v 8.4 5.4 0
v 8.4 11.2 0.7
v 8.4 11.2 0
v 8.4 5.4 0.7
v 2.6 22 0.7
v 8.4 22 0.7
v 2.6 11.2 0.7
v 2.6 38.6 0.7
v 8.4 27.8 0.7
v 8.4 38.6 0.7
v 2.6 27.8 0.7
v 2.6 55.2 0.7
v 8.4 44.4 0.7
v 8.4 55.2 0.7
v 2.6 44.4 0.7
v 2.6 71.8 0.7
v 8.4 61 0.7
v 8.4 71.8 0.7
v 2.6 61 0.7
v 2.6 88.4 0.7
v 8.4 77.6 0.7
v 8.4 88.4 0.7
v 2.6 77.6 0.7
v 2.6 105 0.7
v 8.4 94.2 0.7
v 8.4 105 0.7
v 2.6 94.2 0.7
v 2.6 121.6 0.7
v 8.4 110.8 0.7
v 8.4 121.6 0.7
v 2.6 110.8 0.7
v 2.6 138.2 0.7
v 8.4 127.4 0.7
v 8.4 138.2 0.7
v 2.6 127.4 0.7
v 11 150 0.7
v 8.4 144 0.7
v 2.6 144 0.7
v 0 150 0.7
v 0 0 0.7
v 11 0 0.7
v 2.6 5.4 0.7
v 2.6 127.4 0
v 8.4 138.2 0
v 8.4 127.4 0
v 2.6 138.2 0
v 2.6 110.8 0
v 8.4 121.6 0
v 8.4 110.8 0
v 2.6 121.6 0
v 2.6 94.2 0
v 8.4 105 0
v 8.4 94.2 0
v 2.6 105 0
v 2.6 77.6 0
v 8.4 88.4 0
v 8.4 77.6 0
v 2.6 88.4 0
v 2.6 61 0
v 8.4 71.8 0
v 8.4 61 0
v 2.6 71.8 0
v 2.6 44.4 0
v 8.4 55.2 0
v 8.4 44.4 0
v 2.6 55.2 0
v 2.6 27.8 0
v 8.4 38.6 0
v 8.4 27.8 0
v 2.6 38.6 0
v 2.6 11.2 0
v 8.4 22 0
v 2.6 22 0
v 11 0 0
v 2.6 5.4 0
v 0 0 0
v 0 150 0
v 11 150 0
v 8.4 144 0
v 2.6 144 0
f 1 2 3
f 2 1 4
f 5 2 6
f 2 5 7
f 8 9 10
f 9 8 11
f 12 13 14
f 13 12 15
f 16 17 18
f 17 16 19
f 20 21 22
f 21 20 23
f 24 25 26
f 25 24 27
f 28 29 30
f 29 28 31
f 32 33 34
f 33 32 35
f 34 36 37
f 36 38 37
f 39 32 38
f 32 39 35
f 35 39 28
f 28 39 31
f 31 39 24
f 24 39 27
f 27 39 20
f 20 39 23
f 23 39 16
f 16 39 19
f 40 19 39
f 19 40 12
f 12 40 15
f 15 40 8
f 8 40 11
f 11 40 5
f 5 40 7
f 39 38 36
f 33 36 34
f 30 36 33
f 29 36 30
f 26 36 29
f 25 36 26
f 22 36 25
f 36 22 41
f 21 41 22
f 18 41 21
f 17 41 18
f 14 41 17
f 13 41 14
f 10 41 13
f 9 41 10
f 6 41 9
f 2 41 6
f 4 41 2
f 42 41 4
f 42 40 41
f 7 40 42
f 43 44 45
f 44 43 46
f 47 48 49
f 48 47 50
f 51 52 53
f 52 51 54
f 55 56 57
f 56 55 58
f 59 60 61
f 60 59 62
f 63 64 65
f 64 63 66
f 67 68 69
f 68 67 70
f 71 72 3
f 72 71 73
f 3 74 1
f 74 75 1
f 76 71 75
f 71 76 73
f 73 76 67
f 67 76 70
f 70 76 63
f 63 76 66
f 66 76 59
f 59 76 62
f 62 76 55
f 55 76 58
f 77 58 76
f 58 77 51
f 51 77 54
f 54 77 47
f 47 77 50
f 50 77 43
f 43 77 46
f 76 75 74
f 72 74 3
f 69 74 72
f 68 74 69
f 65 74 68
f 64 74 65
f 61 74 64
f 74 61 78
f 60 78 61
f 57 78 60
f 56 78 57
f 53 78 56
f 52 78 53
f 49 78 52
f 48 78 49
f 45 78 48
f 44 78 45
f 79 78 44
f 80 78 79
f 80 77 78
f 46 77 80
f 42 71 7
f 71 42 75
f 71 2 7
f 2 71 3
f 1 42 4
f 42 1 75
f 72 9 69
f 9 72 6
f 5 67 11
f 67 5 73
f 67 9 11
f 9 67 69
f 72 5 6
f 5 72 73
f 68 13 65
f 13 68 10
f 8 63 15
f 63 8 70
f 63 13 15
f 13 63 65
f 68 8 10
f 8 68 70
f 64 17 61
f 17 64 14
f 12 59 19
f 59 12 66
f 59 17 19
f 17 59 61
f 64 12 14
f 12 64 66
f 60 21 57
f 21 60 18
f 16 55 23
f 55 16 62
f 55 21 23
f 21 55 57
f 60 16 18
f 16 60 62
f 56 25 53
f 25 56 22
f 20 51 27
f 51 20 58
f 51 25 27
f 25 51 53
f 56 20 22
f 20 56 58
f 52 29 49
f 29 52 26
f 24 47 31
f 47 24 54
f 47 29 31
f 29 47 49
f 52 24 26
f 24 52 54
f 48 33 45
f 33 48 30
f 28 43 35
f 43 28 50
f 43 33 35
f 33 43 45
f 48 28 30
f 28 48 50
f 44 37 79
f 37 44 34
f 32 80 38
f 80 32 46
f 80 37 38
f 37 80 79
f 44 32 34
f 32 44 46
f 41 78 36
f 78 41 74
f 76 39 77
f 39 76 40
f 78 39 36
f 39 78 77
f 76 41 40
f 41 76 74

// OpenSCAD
LIFT=0.5;
NOZZLE = 0.5;
GLASS_WIDTH=149.5;
GLASS_HEIGHT=212;
GLASS_THICKNESS=3;
GLASS_CUT_ADD=5;  // on every side
FACE_ROUNDING=3;
FRAME_ADD_SMALL=7;
FRAME_ADD_LARGE=30;
FRAME_THICKNESS=60;
FN=30;
WALL=3;
RACK_WALL=2;

TOUCH_SENSOR_WIDTH = 20;
TOUCH_SENSOR_HEIGHT = 16.5;
TOUCH_SENSOR_BORDER = 3;
TOUCH_SENSOR_REDUCE_WINDOW_HEIGHT=1;

USB_POS = "side";  // bottom/side
USB_WIDTH=15;
USB_HEIGHT=5;
USB_BOARD_TIP_SIZE = 2;
USB_BOARD_WIDTH = 18.5;
USB_BOARD_TIP_Z_OFFSET = 4.5;
USB_BOARD_TIP_WIDTH = 8.5;
USB_BOARD_TIP_HEIGHT = 4.5;
USB_BOARD_LEN = FRAME_ADD_LARGE;

LID_CUT_POS = 110;

THREAD_RADIUS=1.5;
THREAD_HEAD_RADIUS=2.6;
THREAD_HEAD_DEPTH=1.5;
THREAD_DEPTH=12 + THREAD_HEAD_DEPTH;

LED_STRIP_WIDTH = 11;
LED_STRIP_DEPTH = 1;

//MOTION_SENSOR_WIDTH = 16.5;
//MOTION_SENSOR_HEIGHT = 18.5;
//MOTION_SENSOR_TIP_HEIGHT = 2.0;
//MOTION_SENSOR_TIP_WIDTH = 4.1;
//MOTION_SENSOR_TIP_Z = 10;
//MOTION_TO_TOUCH_DISTANCE = 2;


module thread_set() {
    translate([FRAME_ADD_SMALL/2+WALL, FRAME_ADD_LARGE/2])
    cylinder(THREAD_DEPTH, THREAD_RADIUS, THREAD_RADIUS, $fn=FN/2);
    
    translate([FRAME_ADD_SMALL/2+WALL, FRAME_ADD_LARGE/2])
    cylinder(THREAD_HEAD_DEPTH, THREAD_HEAD_RADIUS, THREAD_HEAD_RADIUS, $fn=FN/2);
    
    translate([GLASS_WIDTH+FRAME_ADD_SMALL*3/2-WALL, FRAME_ADD_LARGE/2])
    cylinder(THREAD_DEPTH, THREAD_RADIUS, THREAD_RADIUS, $fn=FN/2);
    
    translate([GLASS_WIDTH+FRAME_ADD_SMALL*3/2-WALL, FRAME_ADD_LARGE/2])
    cylinder(THREAD_HEAD_DEPTH, THREAD_HEAD_RADIUS, THREAD_HEAD_RADIUS, $fn=FN/2);
}

module prop(size) {
    intersection() {
        rotate([45, 0, 0])
        cube([size, size, size], center=true);
        
        cube([size*2, size, size]);
    }
}

module separator_base(lift) {
    translate([FRAME_ADD_SMALL-WALL-lift/2, -lift/2, WALL/2-lift/2])
    cube([GLASS_WIDTH+WALL*2+lift, WALL+lift, FRAME_THICKNESS-WALL+lift]);
}

module frame_base() {
    difference() {
        translate([FACE_ROUNDING, FACE_ROUNDING, -FACE_ROUNDING])
        minkowski() {
            sphere(FACE_ROUNDING, $fn=FN);
            cube([
                GLASS_WIDTH+FRAME_ADD_SMALL*2-FACE_ROUNDING*2,
                GLASS_HEIGHT-FACE_ROUNDING*2+FRAME_ADD_LARGE+FRAME_ADD_SMALL,
                FRAME_THICKNESS,
            ]);
        };
        
        translate([-500, -500, -500])
        cube([1000, 1000, 500]);
    }
}

module frame_cut() {
    translate([-500, 0, -500])
    cube([1000, FRAME_ADD_LARGE-WALL, 1000]);
}

HOLDER_WINGTH_LEN = 60;

module holder_wings(lift=0) {
    for(i=[0, 1]) {
        translate([WALL+lift/2+(GLASS_WIDTH+FRAME_ADD_SMALL*2-WALL-lift/2)*i, 0])
        
        rotate([0, -90, 0])
        linear_extrude(WALL+lift/2)
        polygon([
            [0, 0],
            [0, HOLDER_WINGTH_LEN],
            [FRAME_THICKNESS/3, HOLDER_WINGTH_LEN],
            [FRAME_THICKNESS/3*2, 0],
        ]);
    }
}


module lid(lift) {
    difference() {
        intersection() {
            translate([FACE_ROUNDING+WALL, FACE_ROUNDING+WALL, -FACE_ROUNDING])
            minkowski() {
                sphere(FACE_ROUNDING, $fn=FN);
                cube([
                    GLASS_WIDTH+FRAME_ADD_SMALL*2-FACE_ROUNDING*2-WALL*2+lift,
                    GLASS_HEIGHT-FACE_ROUNDING*2+FRAME_ADD_LARGE*2-WALL*2+lift,
                    FRAME_THICKNESS,
                ]);
            };
            
            translate([-500, -500, 0])
            cube([1000, 1000, WALL]);
            
            frame_cut();
        };
        
        thread_set();
    }
    
    // USB tip
    if (USB_POS == "bottom") {
        translate([(GLASS_WIDTH+FRAME_ADD_SMALL*2 - USB_WIDTH)/2+LIFT/2, 0])
        cube([USB_WIDTH-LIFT, USB_HEIGHT, WALL]);
    }
}



module frame_top() {
    difference() {
        frame_base();
        frame_cut();
        
        // Face window
        translate([FRAME_ADD_SMALL+GLASS_CUT_ADD, FRAME_ADD_LARGE-WALL, FRAME_THICKNESS-WALL])
        cube([GLASS_WIDTH-GLASS_CUT_ADD*2, GLASS_HEIGHT-GLASS_CUT_ADD+WALL, WALL]);
        
        // Main dock
        translate([FRAME_ADD_SMALL, FRAME_ADD_LARGE-WALL, WALL])
        cube([GLASS_WIDTH, GLASS_HEIGHT+WALL, FRAME_THICKNESS-WALL*2]);
                    
        // Separator cut
        translate([0, FRAME_ADD_LARGE-WALL+LIFT/2, 0])
        separator_base(LIFT);
        
        // LED strip cut
        translate([FRAME_ADD_SMALL-LED_STRIP_DEPTH, FRAME_ADD_LARGE, FRAME_THICKNESS/2-LED_STRIP_WIDTH/2])
        cube([GLASS_WIDTH+LED_STRIP_DEPTH*2, GLASS_HEIGHT+LED_STRIP_DEPTH, LED_STRIP_WIDTH]);
        
        // Wings holder
        translate([0, FRAME_ADD_LARGE-WALL, 0])
        holder_wings(LIFT);
        
    };  // end difference

    for(pos=[
        [FRAME_ADD_SMALL, FRAME_ADD_LARGE+LIFT, WALL+GLASS_THICKNESS+LIFT/2],
        [FRAME_ADD_SMALL, FRAME_ADD_LARGE+LIFT, FRAME_THICKNESS-WALL-RACK_WALL-GLASS_THICKNESS*2-LIFT/2+0.5],
        [FRAME_ADD_SMALL+GLASS_WIDTH-RACK_WALL, FRAME_ADD_LARGE+LIFT, WALL+GLASS_THICKNESS+LIFT/2],
        [FRAME_ADD_SMALL+GLASS_WIDTH-RACK_WALL, FRAME_ADD_LARGE+LIFT, FRAME_THICKNESS-WALL-RACK_WALL-GLASS_THICKNESS*2-LIFT/2+0.5],
    ]) {
        translate(pos)
        cube([RACK_WALL, GLASS_HEIGHT, RACK_WALL]);
    }
}



module frame_bottom() {
    thicker_wall=5;
    
    difference() {
        intersection() {
            frame_base();
            frame_cut();
        }
         
        // Tool box
        translate([FRAME_ADD_SMALL+thicker_wall, WALL, 0])
        cube([GLASS_WIDTH-thicker_wall*2, FRAME_ADD_LARGE-WALL*2, FRAME_THICKNESS-WALL]);
            
        // Touch holder
        translate([
            (GLASS_WIDTH+FRAME_ADD_SMALL*2 - TOUCH_SENSOR_WIDTH-LIFT)/2, 
            (FRAME_ADD_LARGE-WALL-TOUCH_SENSOR_HEIGHT-LIFT/2)-2, 
            -100+FRAME_THICKNESS-NOZZLE-0.1,
        ])
        cube([TOUCH_SENSOR_WIDTH+LIFT, TOUCH_SENSOR_HEIGHT+LIFT, 100]);
        
        
        // Touch window
        touch_window_width = TOUCH_SENSOR_WIDTH - TOUCH_SENSOR_BORDER * 2;         
        translate([
            (GLASS_WIDTH+FRAME_ADD_SMALL*2)/2, 
            (FRAME_ADD_LARGE-WALL)-2-touch_window_width/2-TOUCH_SENSOR_REDUCE_WINDOW_HEIGHT, 
            0
        ])
        cylinder(100, touch_window_width/2, touch_window_width/2, $fn=50);
        
        // USB cut
        if (USB_POS == "bottom") {
            translate([
                (GLASS_WIDTH+FRAME_ADD_SMALL*2 - USB_WIDTH)/2, 
                0, 
                0,
            ])
            cube([USB_WIDTH, USB_HEIGHT, WALL*3]);
        }
        if (USB_POS == "side") {
            translate([
                GLASS_WIDTH+FRAME_ADD_SMALL*2-USB_BOARD_LEN, 
                WALL, 
                THREAD_DEPTH+1,
            ]) {
                translate([-USB_BOARD_TIP_SIZE, 0, 0])
                cube([USB_BOARD_LEN, USB_BOARD_WIDTH, USB_BOARD_TIP_Z_OFFSET+USB_BOARD_TIP_HEIGHT]);
                
                translate([USB_BOARD_LEN-USB_BOARD_TIP_SIZE, (USB_BOARD_WIDTH-USB_BOARD_TIP_WIDTH)/2, 0])
                cube([USB_BOARD_TIP_SIZE, USB_BOARD_TIP_WIDTH, USB_BOARD_TIP_HEIGHT]);
            }
        }
        
        // LED wires cut
        depth = 2;
        translate([WALL, FRAME_ADD_LARGE-WALL-depth, (FRAME_THICKNESS-LED_STRIP_WIDTH)/2])
        cube([FRAME_ADD_SMALL+thicker_wall-WALL, depth, LED_STRIP_WIDTH]);
        
        translate([GLASS_WIDTH+FRAME_ADD_SMALL-thicker_wall, FRAME_ADD_LARGE-WALL-depth, (FRAME_THICKNESS-LED_STRIP_WIDTH)/2])
        cube([FRAME_ADD_SMALL+thicker_wall-WALL, depth, LED_STRIP_WIDTH]);
        
        lid(LIFT);
        
        thread_set();    
    };  // end difference

    prop_center_dist = 20;
    prop_size=10;
    translate([GLASS_WIDTH/2+FRAME_ADD_SMALL-prop_center_dist-prop_size/2, WALL, WALL])
    prop(prop_size);

    translate([GLASS_WIDTH/2+FRAME_ADD_SMALL+prop_center_dist, WALL, WALL])
    prop(prop_size);

    if (USB_POS == "bottom") {
        translate([GLASS_WIDTH/2+FRAME_ADD_SMALL-prop_size/4, WALL, USB_HEIGHT+prop_size/4+2])
        prop(prop_size);
    }

    // Face holder extension
    translate([FRAME_ADD_SMALL+GLASS_CUT_ADD, FRAME_ADD_LARGE-WALL, FRAME_THICKNESS-WALL/2])
    cube([GLASS_WIDTH-GLASS_CUT_ADD*2, WALL+GLASS_CUT_ADD, WALL/2]);    
    
    translate([0, FRAME_ADD_LARGE-WALL, 0])
    holder_wings();
}


module separator() {
    len_reduce = 3;
    difference() {
        separator_base(0);
        
        translate([FRAME_ADD_SMALL-LED_STRIP_DEPTH, WALL-LED_STRIP_DEPTH, FRAME_THICKNESS/2-LED_STRIP_WIDTH/2])
        cube([GLASS_WIDTH+LED_STRIP_DEPTH*2, GLASS_HEIGHT+LED_STRIP_DEPTH, LED_STRIP_WIDTH]);
        
        translate([FRAME_ADD_SMALL-WALL, 0, FRAME_THICKNESS/2-LED_STRIP_WIDTH/2])
        cube([5, WALL, LED_STRIP_WIDTH]);
        
        // len reduce
        translate([GLASS_WIDTH+WALL+FRAME_ADD_SMALL-len_reduce, 0, 0])
        cube([100, 100, 100]);
        
    }
}

module led_strip_shield(length) {
    LED_SHIELD_THICKNESS = 0.7;
    led_size = 5;
    lift=0.4;  // each side
    led_spacing = 11.6;
    
    difference() {
        cube([LED_STRIP_WIDTH, length, LED_SHIELD_THICKNESS]);
        
        for (i=[0: floor(length/(led_spacing+led_size))+1]) {
            translate([(LED_STRIP_WIDTH-led_size)/2-lift, led_spacing/2 + i*(led_spacing+led_size)-lift, 0])
            cube([led_size+lift*2, led_size+lift*2, LED_SHIELD_THICKNESS]);
        }
    }
}

FN=70;

!led_strip_shield(150);
frame_bottom();

translate([0, 70, 0])
!rotate([90, 0, 0])
separator();

translate([0, 80, 0])
!rotate([-90, 0, 0])
frame_top();

translate([0, 0, -20])
rotate([180, 0, 0])
lid(0);
